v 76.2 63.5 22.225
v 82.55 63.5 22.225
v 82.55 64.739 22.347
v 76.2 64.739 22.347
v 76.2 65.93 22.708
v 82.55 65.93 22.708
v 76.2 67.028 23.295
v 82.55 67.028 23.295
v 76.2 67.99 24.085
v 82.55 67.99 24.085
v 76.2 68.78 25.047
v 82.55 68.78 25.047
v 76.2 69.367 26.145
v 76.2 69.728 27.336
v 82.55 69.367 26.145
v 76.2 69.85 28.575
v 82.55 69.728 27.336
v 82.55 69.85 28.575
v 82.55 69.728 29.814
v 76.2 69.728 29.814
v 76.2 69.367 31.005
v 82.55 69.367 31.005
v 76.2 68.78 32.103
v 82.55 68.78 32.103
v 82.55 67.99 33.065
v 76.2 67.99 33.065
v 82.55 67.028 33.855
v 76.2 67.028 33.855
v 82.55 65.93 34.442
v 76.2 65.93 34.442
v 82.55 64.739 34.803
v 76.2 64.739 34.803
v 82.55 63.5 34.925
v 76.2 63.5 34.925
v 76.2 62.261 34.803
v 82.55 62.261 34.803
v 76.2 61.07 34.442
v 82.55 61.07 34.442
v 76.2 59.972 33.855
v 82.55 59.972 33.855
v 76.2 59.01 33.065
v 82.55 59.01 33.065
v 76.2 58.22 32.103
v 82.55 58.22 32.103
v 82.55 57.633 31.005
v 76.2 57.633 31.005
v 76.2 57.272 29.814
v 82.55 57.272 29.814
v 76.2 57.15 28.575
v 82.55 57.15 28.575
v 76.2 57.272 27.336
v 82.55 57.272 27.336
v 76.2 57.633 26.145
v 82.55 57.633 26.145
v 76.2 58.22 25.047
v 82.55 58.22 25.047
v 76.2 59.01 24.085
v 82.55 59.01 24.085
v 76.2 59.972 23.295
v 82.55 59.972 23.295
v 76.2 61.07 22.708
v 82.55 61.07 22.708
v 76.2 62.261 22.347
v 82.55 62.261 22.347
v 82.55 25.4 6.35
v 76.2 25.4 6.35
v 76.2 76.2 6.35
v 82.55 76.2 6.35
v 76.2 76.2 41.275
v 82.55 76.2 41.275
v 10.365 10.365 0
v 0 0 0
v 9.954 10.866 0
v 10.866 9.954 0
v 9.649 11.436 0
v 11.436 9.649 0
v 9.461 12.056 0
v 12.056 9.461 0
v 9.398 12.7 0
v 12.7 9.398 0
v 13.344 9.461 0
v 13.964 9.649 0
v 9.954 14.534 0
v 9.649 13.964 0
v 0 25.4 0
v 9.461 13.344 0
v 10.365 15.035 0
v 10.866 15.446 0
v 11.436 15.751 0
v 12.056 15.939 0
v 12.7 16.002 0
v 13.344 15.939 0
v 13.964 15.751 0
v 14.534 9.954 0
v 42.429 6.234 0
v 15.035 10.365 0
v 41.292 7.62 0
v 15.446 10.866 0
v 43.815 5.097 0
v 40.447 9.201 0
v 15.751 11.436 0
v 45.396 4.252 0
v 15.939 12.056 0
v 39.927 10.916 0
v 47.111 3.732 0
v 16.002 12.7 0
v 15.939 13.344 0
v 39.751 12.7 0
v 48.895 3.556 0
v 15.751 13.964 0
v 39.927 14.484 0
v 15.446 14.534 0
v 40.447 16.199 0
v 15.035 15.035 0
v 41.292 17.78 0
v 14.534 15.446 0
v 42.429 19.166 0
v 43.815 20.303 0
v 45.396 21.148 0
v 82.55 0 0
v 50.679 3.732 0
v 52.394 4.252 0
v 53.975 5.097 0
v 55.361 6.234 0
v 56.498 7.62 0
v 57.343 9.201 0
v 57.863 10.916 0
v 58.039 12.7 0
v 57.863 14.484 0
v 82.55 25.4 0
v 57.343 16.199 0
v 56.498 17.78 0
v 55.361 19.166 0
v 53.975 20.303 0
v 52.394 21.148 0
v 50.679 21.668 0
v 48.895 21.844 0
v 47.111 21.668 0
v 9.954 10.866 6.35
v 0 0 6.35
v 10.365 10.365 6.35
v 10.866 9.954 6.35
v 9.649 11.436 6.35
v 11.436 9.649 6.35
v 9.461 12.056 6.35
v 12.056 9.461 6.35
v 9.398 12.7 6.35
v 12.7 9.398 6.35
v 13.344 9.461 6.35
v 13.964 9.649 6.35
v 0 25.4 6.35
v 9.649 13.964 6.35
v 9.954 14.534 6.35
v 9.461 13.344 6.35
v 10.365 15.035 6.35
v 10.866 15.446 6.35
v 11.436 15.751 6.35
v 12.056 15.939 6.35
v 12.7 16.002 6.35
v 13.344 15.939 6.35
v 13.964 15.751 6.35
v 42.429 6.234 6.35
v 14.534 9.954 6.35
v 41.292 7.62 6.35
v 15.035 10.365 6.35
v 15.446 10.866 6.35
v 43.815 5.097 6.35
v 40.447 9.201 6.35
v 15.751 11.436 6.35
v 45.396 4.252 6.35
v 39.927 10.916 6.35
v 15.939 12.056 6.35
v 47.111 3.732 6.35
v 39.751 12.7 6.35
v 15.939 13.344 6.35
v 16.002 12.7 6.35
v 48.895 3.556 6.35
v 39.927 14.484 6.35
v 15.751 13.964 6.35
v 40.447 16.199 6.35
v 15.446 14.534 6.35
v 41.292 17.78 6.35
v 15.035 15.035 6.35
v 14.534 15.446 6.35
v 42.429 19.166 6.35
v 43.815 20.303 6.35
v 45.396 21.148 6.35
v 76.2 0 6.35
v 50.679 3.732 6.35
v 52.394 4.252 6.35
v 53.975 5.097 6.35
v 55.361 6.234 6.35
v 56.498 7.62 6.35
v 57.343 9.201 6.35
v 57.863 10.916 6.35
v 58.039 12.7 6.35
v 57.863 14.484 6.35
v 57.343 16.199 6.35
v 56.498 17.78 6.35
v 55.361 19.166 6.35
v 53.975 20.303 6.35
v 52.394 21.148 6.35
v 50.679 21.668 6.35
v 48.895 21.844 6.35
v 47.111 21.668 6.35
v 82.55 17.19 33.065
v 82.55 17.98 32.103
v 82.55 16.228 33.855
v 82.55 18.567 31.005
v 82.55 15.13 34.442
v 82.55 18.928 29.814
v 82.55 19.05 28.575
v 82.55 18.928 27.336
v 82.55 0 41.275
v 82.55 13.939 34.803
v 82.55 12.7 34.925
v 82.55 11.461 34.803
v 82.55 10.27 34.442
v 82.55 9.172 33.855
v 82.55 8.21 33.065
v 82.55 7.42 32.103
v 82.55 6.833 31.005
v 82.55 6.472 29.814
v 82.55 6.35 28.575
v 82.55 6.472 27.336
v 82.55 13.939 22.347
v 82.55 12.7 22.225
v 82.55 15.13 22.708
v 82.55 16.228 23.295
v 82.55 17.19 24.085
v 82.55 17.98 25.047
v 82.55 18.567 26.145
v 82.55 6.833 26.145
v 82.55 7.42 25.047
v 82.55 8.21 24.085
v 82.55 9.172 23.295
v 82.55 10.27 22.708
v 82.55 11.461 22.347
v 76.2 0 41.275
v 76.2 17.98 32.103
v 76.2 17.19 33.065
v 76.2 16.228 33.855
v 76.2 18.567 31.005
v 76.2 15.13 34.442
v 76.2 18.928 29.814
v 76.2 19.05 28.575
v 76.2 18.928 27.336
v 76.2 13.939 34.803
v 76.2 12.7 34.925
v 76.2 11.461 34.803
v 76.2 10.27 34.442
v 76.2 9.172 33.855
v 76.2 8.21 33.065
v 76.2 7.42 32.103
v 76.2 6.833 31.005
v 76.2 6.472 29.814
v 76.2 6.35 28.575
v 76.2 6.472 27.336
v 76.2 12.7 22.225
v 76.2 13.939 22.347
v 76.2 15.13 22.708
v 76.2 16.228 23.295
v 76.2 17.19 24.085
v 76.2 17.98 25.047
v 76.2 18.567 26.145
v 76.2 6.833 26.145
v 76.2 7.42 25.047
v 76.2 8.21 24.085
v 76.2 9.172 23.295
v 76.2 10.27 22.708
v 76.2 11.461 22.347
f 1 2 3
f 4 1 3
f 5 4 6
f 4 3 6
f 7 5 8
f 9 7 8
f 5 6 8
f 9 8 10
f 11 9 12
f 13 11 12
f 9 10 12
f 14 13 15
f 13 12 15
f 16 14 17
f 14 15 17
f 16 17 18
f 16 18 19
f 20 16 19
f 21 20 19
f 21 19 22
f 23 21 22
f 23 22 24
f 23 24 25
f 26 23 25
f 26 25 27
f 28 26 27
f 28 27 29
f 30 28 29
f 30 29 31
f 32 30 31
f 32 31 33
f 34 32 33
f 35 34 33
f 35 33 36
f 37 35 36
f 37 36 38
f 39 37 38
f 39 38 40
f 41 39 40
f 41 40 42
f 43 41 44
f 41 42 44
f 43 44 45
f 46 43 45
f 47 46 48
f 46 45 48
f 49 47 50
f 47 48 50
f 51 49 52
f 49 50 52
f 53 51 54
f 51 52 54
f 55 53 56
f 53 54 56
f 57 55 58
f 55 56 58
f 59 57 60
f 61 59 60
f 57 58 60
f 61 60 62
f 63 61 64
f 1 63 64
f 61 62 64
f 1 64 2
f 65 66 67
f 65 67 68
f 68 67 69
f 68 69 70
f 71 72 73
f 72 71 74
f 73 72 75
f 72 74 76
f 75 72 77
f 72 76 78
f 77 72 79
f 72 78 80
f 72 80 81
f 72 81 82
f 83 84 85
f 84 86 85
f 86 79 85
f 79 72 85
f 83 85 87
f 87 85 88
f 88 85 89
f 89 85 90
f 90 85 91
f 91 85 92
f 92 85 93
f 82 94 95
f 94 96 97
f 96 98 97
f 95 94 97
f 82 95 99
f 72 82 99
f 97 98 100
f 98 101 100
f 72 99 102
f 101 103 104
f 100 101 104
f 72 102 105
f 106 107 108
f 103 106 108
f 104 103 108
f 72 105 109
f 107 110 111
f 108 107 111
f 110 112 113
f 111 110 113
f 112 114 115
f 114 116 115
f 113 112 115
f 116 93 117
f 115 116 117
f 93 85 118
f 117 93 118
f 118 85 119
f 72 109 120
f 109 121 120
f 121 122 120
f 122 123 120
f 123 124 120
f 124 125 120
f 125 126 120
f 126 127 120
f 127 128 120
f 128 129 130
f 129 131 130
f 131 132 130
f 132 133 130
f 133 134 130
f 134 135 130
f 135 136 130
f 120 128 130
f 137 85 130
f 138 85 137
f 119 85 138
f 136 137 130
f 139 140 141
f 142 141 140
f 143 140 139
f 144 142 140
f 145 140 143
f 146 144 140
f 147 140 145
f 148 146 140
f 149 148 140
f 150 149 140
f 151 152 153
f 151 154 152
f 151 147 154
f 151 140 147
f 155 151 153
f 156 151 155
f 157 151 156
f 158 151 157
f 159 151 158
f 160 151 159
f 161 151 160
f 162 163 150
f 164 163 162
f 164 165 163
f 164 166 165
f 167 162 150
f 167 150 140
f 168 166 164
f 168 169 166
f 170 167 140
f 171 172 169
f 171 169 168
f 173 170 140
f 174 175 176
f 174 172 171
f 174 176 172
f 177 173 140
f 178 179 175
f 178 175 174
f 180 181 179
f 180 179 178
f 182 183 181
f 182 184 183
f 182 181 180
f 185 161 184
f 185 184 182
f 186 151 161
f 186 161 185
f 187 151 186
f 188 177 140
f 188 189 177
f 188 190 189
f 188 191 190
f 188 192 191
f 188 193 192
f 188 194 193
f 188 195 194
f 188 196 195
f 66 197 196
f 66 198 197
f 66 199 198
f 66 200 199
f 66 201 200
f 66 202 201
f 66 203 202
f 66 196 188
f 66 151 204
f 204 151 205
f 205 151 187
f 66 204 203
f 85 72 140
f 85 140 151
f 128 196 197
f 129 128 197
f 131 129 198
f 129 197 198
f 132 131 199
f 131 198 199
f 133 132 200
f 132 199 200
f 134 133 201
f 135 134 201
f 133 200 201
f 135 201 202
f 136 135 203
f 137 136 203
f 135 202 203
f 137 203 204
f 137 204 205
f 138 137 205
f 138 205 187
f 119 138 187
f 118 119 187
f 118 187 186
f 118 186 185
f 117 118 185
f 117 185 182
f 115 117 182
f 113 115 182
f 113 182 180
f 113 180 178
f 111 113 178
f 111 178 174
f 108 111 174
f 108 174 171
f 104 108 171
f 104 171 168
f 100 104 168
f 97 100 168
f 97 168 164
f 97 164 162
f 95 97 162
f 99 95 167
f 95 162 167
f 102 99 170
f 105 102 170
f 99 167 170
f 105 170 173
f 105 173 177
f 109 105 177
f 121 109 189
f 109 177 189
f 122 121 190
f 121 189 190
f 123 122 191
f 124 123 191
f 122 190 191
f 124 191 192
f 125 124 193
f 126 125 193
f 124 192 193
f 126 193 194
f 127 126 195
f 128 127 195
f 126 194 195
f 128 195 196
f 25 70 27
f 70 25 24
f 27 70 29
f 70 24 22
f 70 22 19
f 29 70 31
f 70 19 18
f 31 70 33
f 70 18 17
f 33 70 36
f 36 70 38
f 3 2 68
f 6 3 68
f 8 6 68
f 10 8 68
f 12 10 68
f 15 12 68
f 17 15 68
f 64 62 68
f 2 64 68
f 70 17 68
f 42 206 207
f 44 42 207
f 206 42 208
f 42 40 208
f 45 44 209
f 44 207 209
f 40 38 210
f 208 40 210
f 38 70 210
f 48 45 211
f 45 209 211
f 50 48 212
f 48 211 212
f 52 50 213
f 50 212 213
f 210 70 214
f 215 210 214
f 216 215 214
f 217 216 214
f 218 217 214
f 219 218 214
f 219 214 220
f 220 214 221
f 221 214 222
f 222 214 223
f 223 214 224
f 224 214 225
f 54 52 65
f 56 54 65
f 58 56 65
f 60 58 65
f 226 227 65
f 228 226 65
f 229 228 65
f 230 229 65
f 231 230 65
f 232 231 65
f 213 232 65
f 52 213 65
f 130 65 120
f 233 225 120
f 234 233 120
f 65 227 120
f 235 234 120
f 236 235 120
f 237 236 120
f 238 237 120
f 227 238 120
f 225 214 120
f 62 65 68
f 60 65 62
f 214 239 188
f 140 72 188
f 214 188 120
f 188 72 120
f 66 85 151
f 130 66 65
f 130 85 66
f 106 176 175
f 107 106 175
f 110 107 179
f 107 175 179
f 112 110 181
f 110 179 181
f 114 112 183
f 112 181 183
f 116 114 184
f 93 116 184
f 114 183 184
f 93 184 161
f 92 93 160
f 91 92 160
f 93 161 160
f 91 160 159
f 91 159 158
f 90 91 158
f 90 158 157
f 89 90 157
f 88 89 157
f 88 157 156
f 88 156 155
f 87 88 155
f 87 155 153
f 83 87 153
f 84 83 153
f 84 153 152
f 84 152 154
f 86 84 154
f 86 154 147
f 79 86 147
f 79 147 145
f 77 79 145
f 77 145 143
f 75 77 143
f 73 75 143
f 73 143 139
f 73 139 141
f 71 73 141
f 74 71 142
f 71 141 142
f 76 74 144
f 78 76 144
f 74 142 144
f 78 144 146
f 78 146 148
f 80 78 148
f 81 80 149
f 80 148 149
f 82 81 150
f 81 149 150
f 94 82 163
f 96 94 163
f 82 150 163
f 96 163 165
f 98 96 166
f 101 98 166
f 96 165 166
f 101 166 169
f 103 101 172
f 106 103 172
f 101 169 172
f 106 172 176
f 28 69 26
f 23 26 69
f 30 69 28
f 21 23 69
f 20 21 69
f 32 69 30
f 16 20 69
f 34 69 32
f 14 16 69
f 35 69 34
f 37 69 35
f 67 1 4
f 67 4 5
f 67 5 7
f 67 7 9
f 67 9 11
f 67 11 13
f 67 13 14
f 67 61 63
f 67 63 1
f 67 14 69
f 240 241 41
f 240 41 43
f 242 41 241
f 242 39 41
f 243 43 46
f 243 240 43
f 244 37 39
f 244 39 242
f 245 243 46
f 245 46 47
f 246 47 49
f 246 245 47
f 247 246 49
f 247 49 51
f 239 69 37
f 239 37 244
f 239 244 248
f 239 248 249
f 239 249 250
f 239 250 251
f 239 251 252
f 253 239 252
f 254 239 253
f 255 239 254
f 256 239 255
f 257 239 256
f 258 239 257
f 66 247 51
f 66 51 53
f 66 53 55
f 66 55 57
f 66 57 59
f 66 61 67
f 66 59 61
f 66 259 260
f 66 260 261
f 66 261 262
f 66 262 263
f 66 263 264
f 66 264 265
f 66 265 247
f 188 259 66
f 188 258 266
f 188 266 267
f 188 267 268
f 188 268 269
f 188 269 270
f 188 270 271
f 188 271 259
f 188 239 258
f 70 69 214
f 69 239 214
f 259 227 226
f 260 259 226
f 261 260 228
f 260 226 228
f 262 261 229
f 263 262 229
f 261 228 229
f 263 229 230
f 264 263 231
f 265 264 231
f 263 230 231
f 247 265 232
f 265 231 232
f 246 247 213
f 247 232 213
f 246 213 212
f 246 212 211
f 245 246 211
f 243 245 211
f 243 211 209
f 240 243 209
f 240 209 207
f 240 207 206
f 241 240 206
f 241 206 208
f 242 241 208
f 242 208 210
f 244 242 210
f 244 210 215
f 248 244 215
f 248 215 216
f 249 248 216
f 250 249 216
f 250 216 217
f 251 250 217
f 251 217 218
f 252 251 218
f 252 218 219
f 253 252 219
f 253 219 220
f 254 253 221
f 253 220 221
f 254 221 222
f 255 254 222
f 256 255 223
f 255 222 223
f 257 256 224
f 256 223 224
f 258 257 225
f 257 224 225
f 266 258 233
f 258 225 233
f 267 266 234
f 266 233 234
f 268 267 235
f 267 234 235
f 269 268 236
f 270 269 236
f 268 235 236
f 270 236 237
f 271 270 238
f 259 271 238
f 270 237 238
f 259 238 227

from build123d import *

# Parameters (mm, degrees)
SKETCH1_W           = 82.55
SKETCH1_H           = 25.4
BOSS_EXTRUDE1_DEPTH = 6.35
SKETCH2_W           = 6.35
SKETCH2_H           = 25.4
BOSS_EXTRUDE2_DEPTH = 34.925
SKETCH4_R           = 6.35
CUT_EXTRUDE1_DEPTH  = 96.725065291
SKETCH5_R           = 3.302
SKETCH5_R_2         = 9.144
CUT_EXTRUDE2_DEPTH  = 38.1
SKETCH6_W           = 6.35
SKETCH6_H           = 34.925
BOSS_EXTRUDE3_DEPTH = 50.8
SKETCH7_R           = 6.35
CUT_EXTRUDE3_DEPTH  = 120.685287839


with BuildPart() as part:
    # Sketch1 → Boss-Extrude1 (new body)
    with BuildSketch(Plane.XY):
        with Locations((41.275, 12.7)):
            Rectangle(SKETCH1_W, SKETCH1_H)
    extrude(amount=BOSS_EXTRUDE1_DEPTH)

    # Sketch2 → Boss-Extrude2 (add)
    with BuildSketch(Plane.XY.offset(6.35)):
        with Locations((79.375, 12.7)):
            Rectangle(SKETCH2_W, SKETCH2_H)
    extrude(amount=BOSS_EXTRUDE2_DEPTH)

    # Sketch4 → Cut-Extrude1 (cut, through all)
    with BuildSketch(Plane(origin=(82.55, 0, 0), x_dir=(0, 0, -1), z_dir=(1, 0, 0))):
        with Locations((-28.575, 12.7)):
            Circle(SKETCH4_R)
    extrude(amount=-CUT_EXTRUDE1_DEPTH, mode=Mode.SUBTRACT)

    # Sketch5 → Cut-Extrude2 (cut)
    with BuildSketch(Plane.XY.offset(6.35)):
        with Locations((12.7, 12.7)):
            Circle(SKETCH5_R)
        with Locations((48.895, 12.7)):
            Circle(SKETCH5_R_2)
    extrude(amount=-CUT_EXTRUDE2_DEPTH, mode=Mode.SUBTRACT)

    # Sketch6 → Boss-Extrude3 (add)
    with BuildSketch(Plane(origin=(0, 25.4, 0), x_dir=(1, 0, 0), z_dir=(0, 1, 0))):
        with Locations((79.375, -23.8125)):
            Rectangle(SKETCH6_W, SKETCH6_H)
    extrude(amount=BOSS_EXTRUDE3_DEPTH)

    # Sketch7 → Cut-Extrude3 (cut, through all)
    with BuildSketch(Plane(origin=(82.55, 0, 0), x_dir=(0, 0, -1), z_dir=(1, 0, 0))):
        with Locations((-28.575, 63.5)):
            Circle(SKETCH7_R)
    extrude(amount=-CUT_EXTRUDE3_DEPTH, mode=Mode.SUBTRACT)


solid = part.part
